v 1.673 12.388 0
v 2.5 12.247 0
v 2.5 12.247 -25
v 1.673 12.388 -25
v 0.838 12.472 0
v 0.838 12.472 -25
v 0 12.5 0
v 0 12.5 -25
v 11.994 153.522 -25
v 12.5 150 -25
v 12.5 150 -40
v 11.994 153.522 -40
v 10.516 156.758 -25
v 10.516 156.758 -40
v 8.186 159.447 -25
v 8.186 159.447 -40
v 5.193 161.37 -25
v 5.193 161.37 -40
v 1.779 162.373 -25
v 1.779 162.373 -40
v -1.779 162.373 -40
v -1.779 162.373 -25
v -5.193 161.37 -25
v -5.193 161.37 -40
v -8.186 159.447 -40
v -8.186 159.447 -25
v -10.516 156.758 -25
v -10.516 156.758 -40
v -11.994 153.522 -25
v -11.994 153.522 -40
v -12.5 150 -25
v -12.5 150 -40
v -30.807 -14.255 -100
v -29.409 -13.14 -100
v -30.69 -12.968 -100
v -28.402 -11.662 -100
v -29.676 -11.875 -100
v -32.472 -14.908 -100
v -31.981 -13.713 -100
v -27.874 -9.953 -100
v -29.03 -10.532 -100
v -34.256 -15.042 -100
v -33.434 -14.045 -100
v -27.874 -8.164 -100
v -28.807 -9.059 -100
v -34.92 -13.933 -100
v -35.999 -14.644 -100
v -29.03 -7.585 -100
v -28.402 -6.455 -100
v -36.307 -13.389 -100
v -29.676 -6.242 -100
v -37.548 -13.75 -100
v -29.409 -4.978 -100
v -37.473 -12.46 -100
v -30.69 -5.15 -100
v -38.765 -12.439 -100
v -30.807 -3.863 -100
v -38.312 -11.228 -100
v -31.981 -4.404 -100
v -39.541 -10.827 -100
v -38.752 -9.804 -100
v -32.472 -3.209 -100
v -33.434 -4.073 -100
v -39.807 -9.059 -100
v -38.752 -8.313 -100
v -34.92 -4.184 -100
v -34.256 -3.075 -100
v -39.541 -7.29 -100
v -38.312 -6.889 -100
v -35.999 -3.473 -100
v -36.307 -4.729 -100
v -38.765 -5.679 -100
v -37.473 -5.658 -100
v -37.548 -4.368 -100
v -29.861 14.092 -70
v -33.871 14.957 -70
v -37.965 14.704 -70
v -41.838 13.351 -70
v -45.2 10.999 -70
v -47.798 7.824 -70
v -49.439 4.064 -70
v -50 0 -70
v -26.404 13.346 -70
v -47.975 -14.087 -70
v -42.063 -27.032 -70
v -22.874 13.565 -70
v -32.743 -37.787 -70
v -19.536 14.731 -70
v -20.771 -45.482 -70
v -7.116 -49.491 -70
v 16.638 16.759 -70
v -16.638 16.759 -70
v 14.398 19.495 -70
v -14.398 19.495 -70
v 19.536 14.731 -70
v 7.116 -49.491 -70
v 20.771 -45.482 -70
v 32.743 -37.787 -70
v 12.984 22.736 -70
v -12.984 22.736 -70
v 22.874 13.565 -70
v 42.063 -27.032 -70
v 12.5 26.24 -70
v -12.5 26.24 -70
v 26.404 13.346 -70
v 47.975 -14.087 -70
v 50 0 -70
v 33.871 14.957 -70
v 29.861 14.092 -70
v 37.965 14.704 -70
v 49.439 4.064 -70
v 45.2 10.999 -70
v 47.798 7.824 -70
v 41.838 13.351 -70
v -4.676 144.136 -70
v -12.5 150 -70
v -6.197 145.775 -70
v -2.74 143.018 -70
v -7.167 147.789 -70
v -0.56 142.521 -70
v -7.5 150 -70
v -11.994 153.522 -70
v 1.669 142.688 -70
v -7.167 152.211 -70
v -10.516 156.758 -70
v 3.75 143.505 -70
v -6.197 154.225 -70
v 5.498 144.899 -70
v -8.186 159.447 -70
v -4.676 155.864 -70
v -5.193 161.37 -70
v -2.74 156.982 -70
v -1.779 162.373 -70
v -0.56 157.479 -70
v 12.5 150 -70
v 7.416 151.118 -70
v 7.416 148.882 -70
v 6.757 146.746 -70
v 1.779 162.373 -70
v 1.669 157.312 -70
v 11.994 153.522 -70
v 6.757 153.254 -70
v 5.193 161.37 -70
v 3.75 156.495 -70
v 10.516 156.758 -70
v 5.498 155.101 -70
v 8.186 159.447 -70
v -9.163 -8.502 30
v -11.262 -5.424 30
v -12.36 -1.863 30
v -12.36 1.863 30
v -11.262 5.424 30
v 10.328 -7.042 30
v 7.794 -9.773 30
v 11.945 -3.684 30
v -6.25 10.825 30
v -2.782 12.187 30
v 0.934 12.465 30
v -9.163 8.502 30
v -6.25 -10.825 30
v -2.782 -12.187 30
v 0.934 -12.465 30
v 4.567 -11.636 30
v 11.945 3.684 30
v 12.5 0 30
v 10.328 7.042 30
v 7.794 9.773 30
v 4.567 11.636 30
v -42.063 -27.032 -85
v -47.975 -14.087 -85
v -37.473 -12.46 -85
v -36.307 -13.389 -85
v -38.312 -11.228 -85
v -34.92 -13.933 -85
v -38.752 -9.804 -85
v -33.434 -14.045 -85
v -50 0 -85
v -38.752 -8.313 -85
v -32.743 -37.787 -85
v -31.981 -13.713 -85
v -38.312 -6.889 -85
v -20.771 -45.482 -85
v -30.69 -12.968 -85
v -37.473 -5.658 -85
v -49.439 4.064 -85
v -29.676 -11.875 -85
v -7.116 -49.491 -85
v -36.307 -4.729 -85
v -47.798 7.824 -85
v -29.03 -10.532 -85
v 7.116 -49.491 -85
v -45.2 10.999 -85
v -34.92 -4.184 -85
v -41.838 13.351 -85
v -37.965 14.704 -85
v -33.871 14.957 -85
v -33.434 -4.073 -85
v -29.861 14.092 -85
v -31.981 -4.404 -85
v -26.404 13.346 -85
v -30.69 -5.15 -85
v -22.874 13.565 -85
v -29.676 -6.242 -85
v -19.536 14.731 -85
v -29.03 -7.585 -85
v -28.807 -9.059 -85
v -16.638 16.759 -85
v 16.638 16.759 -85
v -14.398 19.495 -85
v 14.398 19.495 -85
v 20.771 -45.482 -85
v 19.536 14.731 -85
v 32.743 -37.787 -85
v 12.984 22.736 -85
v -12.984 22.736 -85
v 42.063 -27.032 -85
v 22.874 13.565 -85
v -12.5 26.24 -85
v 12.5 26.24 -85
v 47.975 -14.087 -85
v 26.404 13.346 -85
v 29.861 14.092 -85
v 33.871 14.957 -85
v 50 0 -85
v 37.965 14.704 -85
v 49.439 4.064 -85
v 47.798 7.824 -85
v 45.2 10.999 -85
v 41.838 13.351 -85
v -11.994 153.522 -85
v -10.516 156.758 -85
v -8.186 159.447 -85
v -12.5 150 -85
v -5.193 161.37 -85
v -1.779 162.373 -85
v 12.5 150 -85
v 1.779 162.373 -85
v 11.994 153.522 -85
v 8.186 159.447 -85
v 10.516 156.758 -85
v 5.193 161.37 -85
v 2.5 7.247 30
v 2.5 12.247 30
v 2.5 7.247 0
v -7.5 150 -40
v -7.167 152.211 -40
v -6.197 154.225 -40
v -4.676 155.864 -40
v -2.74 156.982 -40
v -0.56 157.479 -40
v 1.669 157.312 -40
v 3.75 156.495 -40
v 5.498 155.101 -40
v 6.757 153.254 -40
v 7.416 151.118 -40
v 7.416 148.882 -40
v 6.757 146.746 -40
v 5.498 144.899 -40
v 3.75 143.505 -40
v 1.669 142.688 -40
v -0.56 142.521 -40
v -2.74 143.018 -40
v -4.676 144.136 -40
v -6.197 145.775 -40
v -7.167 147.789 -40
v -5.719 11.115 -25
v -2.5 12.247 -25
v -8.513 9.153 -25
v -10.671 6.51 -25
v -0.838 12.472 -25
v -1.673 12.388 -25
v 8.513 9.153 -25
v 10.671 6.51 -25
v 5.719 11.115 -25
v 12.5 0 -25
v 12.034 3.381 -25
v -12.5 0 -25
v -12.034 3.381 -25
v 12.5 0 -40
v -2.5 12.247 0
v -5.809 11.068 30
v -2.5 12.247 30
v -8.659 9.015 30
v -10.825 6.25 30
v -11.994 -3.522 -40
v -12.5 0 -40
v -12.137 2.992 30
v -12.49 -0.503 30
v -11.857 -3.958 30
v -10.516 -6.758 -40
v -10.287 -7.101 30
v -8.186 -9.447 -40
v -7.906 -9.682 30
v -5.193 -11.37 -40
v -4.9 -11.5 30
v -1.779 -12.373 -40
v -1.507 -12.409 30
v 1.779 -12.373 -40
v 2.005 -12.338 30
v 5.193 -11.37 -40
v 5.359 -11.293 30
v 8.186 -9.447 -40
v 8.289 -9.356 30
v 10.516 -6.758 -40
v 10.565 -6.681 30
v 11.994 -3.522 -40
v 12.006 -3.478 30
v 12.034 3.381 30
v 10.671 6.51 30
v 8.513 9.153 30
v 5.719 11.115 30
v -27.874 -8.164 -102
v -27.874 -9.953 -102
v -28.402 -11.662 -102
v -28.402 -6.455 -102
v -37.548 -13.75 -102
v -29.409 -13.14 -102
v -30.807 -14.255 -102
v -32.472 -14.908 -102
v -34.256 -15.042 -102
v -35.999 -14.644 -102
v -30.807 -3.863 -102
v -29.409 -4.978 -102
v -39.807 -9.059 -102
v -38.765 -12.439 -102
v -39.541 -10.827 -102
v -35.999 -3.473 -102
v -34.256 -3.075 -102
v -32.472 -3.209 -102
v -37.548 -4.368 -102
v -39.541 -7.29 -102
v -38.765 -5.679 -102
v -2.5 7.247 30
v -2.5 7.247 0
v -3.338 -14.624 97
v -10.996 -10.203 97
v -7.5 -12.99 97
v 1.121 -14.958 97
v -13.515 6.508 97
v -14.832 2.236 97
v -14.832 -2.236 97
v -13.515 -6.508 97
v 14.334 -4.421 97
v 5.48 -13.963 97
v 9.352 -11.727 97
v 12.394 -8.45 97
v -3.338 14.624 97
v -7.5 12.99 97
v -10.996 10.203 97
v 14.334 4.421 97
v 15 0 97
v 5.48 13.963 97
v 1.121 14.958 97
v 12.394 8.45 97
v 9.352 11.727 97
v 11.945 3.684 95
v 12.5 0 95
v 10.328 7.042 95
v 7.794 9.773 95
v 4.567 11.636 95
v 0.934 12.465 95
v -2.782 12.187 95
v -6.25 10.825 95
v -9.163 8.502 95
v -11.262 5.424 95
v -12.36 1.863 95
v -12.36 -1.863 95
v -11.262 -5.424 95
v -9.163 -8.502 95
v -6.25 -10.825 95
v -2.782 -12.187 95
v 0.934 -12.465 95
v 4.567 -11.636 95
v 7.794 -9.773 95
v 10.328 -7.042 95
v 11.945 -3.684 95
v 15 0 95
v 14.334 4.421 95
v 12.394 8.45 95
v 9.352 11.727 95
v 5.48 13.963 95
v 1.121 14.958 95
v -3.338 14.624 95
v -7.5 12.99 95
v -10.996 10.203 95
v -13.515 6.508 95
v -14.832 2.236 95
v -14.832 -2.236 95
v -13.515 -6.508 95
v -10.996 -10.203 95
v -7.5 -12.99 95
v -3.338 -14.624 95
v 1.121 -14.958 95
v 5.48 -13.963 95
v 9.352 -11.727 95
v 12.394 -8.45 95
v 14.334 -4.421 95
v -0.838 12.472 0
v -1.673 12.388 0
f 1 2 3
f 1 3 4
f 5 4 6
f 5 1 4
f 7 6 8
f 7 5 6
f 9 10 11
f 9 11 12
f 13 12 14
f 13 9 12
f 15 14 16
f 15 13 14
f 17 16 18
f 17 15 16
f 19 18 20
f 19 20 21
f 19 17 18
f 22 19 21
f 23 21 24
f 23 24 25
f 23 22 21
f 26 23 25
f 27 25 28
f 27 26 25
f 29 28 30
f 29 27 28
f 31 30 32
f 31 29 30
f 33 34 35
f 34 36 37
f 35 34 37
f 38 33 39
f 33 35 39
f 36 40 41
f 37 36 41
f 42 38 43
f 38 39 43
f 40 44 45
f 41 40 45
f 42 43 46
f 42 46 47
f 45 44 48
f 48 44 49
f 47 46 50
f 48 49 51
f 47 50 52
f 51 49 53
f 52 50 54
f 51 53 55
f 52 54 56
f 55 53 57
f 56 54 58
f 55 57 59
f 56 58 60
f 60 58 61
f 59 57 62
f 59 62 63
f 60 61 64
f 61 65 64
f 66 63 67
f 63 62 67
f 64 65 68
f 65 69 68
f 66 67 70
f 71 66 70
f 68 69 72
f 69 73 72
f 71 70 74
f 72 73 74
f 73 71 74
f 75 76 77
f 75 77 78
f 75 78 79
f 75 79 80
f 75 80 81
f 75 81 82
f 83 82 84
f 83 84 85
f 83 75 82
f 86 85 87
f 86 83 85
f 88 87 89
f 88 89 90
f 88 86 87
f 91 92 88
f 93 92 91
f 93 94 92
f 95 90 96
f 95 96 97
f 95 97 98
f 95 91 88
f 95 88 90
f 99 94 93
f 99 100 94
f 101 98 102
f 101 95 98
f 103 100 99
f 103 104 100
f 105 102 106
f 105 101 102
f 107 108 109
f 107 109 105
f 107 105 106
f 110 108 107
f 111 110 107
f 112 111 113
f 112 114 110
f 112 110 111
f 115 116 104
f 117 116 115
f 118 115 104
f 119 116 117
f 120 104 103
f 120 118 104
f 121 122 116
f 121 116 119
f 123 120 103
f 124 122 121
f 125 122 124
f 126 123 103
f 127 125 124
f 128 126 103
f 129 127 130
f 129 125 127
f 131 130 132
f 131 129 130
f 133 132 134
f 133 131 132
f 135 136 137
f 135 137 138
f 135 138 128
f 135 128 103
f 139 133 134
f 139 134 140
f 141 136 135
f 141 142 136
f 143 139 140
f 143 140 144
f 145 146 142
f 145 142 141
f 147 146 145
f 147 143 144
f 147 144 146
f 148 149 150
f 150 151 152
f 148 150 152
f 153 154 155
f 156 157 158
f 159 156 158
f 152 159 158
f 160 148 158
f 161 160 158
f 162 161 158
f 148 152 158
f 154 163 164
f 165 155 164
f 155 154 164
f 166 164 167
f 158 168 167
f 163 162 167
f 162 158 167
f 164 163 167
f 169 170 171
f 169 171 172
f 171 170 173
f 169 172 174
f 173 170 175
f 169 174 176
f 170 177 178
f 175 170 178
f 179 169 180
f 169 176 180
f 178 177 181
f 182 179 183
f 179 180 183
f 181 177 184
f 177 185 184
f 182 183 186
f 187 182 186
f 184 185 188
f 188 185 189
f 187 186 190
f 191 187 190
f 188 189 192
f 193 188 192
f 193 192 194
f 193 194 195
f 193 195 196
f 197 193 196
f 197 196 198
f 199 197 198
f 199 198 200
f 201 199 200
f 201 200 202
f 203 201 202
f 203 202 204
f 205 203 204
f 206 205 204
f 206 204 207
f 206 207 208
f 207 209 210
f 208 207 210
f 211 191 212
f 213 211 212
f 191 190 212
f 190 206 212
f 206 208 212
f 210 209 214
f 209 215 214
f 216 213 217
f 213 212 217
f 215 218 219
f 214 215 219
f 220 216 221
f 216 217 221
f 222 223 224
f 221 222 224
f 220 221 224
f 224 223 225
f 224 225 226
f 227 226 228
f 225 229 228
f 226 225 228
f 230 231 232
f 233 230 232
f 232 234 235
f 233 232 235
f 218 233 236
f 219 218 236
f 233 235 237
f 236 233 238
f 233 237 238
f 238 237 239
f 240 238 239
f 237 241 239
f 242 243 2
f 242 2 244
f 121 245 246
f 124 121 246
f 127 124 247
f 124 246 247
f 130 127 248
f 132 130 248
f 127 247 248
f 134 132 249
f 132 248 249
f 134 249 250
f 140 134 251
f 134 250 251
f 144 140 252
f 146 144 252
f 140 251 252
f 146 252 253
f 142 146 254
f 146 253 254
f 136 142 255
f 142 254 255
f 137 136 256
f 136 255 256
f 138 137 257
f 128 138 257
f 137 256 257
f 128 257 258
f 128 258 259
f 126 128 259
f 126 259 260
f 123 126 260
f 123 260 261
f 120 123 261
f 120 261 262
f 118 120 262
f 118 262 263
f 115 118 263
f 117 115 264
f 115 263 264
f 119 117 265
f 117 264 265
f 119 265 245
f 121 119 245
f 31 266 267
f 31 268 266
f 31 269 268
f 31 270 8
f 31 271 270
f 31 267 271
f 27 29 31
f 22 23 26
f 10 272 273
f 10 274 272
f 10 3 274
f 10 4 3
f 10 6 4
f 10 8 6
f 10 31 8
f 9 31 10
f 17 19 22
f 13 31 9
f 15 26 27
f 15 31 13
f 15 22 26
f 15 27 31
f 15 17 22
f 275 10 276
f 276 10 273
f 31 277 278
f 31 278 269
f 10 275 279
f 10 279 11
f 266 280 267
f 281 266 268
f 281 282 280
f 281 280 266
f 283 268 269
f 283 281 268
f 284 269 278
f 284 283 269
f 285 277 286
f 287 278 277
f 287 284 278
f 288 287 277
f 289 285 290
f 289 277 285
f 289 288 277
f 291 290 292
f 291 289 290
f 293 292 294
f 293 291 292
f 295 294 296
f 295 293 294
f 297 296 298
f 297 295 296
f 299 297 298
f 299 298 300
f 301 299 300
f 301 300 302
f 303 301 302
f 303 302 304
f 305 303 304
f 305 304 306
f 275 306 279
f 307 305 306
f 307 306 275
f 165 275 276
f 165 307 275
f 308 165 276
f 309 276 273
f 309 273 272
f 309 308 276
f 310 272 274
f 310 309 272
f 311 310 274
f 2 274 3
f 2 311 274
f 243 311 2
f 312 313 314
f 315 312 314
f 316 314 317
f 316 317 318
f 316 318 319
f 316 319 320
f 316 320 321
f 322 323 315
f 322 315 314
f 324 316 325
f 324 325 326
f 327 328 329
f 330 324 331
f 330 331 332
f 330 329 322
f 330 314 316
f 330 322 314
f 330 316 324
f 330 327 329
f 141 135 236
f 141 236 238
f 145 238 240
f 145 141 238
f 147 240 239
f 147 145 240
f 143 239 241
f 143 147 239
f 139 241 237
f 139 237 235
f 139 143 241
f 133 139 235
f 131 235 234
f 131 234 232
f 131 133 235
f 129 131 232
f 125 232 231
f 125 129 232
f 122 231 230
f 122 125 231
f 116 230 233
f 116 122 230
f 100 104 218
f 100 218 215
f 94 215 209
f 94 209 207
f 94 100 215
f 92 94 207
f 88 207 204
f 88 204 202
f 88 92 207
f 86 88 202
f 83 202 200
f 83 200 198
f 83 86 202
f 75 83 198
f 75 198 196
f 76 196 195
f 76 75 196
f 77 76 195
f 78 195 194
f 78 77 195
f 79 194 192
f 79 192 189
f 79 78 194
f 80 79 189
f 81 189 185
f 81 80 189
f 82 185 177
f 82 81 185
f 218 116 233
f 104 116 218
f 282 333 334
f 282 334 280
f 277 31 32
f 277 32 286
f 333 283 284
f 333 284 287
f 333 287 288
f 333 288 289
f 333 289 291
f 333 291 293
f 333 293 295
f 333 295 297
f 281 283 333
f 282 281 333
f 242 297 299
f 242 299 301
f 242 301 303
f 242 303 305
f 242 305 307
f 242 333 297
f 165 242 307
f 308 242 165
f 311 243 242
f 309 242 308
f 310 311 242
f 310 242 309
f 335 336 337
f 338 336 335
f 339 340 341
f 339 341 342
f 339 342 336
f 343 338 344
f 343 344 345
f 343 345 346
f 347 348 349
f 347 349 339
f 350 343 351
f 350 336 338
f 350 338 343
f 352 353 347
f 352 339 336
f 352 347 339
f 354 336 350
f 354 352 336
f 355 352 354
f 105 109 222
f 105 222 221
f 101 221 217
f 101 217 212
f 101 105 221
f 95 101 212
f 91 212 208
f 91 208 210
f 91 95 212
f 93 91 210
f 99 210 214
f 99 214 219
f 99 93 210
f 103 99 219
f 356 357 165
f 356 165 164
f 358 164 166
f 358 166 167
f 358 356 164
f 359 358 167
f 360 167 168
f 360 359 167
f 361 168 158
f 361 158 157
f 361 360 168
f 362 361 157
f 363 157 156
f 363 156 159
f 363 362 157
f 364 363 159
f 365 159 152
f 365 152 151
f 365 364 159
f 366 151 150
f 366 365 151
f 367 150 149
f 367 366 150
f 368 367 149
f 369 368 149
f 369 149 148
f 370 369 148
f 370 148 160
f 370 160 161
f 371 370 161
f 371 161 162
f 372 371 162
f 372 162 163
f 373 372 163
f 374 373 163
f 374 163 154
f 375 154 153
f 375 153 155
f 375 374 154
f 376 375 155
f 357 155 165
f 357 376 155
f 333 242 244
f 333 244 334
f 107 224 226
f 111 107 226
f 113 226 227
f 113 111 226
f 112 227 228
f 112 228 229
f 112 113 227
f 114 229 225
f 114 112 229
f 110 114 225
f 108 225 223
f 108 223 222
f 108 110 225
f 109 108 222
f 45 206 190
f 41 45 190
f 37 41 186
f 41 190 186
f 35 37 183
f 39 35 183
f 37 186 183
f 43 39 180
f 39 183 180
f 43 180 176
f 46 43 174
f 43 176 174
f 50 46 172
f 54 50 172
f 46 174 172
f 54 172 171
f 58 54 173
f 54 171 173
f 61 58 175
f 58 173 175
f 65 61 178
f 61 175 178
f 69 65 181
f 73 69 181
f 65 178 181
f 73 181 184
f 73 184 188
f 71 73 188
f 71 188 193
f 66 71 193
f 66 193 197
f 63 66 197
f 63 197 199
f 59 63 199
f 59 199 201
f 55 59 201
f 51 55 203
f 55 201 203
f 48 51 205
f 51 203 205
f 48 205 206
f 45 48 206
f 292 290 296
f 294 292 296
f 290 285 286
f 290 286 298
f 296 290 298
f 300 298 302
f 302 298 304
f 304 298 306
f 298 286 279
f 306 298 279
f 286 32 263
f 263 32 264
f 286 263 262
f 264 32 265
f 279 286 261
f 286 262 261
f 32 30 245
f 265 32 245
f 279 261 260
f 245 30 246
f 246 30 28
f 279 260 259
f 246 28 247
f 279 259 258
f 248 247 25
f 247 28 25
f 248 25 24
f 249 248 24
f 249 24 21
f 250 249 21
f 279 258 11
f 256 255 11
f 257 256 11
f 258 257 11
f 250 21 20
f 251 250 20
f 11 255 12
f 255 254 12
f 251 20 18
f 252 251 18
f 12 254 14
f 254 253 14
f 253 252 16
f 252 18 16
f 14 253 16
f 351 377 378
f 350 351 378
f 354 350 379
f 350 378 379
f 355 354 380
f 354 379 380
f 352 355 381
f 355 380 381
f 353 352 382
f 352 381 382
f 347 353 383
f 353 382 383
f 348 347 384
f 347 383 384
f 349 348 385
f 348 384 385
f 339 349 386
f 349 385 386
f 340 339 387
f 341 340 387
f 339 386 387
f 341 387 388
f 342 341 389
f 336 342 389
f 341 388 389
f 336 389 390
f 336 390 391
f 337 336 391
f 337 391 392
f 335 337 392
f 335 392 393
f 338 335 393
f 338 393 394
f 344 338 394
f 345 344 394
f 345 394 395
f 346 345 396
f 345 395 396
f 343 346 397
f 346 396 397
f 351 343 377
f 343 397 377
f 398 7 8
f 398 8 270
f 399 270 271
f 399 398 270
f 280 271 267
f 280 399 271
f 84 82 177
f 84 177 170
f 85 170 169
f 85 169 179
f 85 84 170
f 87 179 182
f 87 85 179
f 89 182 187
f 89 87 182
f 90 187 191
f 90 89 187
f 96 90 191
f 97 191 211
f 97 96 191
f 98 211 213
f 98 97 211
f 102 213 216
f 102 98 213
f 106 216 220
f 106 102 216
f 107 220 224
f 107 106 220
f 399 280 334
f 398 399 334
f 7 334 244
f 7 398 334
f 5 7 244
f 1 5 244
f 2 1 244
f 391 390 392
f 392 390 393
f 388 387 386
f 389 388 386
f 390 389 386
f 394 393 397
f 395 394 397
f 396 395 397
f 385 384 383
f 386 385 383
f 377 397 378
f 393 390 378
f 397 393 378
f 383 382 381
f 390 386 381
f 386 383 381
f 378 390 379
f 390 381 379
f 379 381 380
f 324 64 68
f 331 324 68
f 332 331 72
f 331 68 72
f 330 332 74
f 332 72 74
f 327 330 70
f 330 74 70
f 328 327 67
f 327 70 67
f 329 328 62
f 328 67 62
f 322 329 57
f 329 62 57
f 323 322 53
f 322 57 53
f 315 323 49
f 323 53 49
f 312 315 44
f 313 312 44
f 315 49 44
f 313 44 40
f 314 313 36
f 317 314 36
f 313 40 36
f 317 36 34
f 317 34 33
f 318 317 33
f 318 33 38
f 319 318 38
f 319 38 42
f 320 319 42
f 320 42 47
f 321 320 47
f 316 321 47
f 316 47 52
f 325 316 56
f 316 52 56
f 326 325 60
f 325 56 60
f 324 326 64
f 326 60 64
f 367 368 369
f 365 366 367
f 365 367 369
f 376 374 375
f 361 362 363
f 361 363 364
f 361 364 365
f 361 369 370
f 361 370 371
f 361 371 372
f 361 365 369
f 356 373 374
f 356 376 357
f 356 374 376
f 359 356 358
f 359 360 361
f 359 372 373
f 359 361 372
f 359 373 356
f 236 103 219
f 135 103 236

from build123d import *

# Parameters (mm, degrees)
BOSS_EXTRUDE1_START  = 30
BOSS_EXTRUDE1_DEPTH  = 55
BOSS_EXTRUDE3_DEPTH  = 15
SKETCH5_R            = 7.5
BOSS_EXTRUDE4_DEPTH  = 30
BOSS_EXTRUDE5_DEPTH  = 15
BOSS_EXTRUDE7_DEPTH  = 15
BOSS_EXTRUDE8_START  = 65
SKETCH12_R           = 12.5
BOSS_EXTRUDE8_DEPTH  = 65
SKETCH14_R           = 15
BOSS_EXTRUDE9_DEPTH  = 2
SKETCH2_5_W          = 5
SKETCH2_5_H          = 5
BOSS_EXTRUDE10_DEPTH = 30
SKETCH10_R           = 5
BOSS_EXTRUDE11_DEPTH = 15
BOSS_EXTRUDE12_START = 15
SKETCH10_3_R         = 6
SKETCH10_3_R_2       = 5
BOSS_EXTRUDE12_DEPTH = 2


with BuildPart() as part:
    # Sketch2 → Boss-Extrude1 (new body)
    with BuildSketch(Plane.XY.offset(BOSS_EXTRUDE1_START)):
        with BuildLine():
            Line((-2.5, 7.247448714), (-2.5, 12.247448714))
            ThreePointArc((-2.5, 12.247448714), (-7.90569415, -9.682458366), (12.5, 0))
            ThreePointArc((12.5, 0), (9.682458366, 7.90569415), (2.5, 12.247448714))
            Line((2.5, 12.247448714), (2.5, 7.247448714))
            Line((2.5, 7.247448714), (-2.5, 7.247448714))
        make_face()
    extrude(amount=-BOSS_EXTRUDE1_DEPTH)

    # Sketch3 → Boss-Extrude3 (add)
    with BuildSketch(Plane(origin=(0, 0, -25), x_dir=(-1, 0, 0), z_dir=(0, 0, -1))):
        with BuildLine():
            Line((-12.5, 0), (-12.5, 150))
            ThreePointArc((-12.5, 150), (0, 162.5), (12.5, 150))
            Line((12.5, 150), (12.5, 0))
            ThreePointArc((12.5, 0), (0, -12.5), (-12.5, 0))
        make_face()
    extrude(amount=BOSS_EXTRUDE3_DEPTH)

    # Sketch5 → Boss-Extrude4 (add)
    with BuildSketch(Plane(origin=(0, 0, -40), x_dir=(-1, 0, 0), z_dir=(0, 0, -1))):
        with Locations((0, 150)):
            Circle(SKETCH5_R)
    extrude(amount=BOSS_EXTRUDE4_DEPTH)

    # Sketch6 → Boss-Extrude5 (add)
    with BuildSketch(Plane(origin=(0, 0, -70), x_dir=(-1, 0, 0), z_dir=(0, 0, -1))):
        with BuildLine():
            Line((12.5, 150), (12.5, 0))
            ThreePointArc((12.5, 0), (0, -12.5), (-12.5, 0))
            Line((-12.5, 0), (-12.5, 150))
            ThreePointArc((-12.5, 150), (0, 162.5), (12.5, 150))
        make_face()
    extrude(amount=BOSS_EXTRUDE5_DEPTH)

    # Sketch8 → Boss-Extrude7 (add)
    with BuildSketch(Plane(origin=(0, 0, -70), x_dir=(-1, 0, 0), z_dir=(0, 0, -1))):
        with BuildLine():
            ThreePointArc((50, 0), (0, -50), (-50, 0))
            ThreePointArc((-50, 0), (-43.599648561, 12.290079114), (-29.860527384, 14.092048156))
            ThreePointArc((-29.860527384, 14.092048156), (-18.017198913, 15.645372491), (-12.5, 26.239604975))
            ThreePointArc((-12.5, 26.239604975), (0, 38.739604975), (12.5, 26.239604975))
            ThreePointArc((12.5, 26.239604975), (18.017198913, 15.645372491), (29.860527384, 14.092048156))
            ThreePointArc((29.860527384, 14.092048156), (43.599648561, 12.290079114), (50, 0))
        make_face()
    extrude(amount=BOSS_EXTRUDE7_DEPTH)

    # Sketch2<5> → Boss-Extrude10 (add)
    with BuildSketch(Plane.XY):
        with BuildLine():
            Line((-2.5, 7.247448714), (-2.5, 12.247448714))
            ThreePointArc((-2.5, 12.247448714), (-7.90569415, -9.682458366), (12.5, 0))
            ThreePointArc((12.5, 0), (9.682458366, 7.90569415), (2.5, 12.247448714))
            Line((2.5, 12.247448714), (2.5, 7.247448714))
            Line((2.5, 7.247448714), (-2.5, 7.247448714))
        make_face()
        with Locations((0, 9.747448714)):
            Rectangle(SKETCH2_5_W, SKETCH2_5_H)
        with BuildLine():
            ThreePointArc((0, 12.5), (-1.256362025, 12.436701913), (-2.5, 12.247448714))
            Line((-2.5, 12.247448714), (0, 12.247448714))
            Line((0, 12.247448714), (0, 12.5))
        make_face()
        with BuildLine():
            Line((0, 12.5), (0, 12.247448714))
            Line((0, 12.247448714), (2.5, 12.247448714))
            ThreePointArc((2.5, 12.247448714), (1.256362025, 12.436701913), (0, 12.5))
        make_face()
    extrude(amount=-BOSS_EXTRUDE10_DEPTH)

    # Sketch10 → Boss-Extrude11 (add)
    with BuildSketch(Plane(origin=(0, 0, -85), x_dir=(-1, 0, 0), z_dir=(0, 0, -1))):
        with Locations(Location((33.80740392, -9.058666579, 0), (0, 0, 180))):
            Circle(SKETCH10_R)
    extrude(amount=BOSS_EXTRUDE11_DEPTH)

    # Sketch10<3> → Boss-Extrude12 (add)
    # profile 1 of 2: a face of its own
    with BuildSketch(Plane(origin=(0, 0, -85), x_dir=(-1, 0, 0), z_dir=(0, 0, -1)).offset(BOSS_EXTRUDE12_START)):
        with Locations((33.80740392, -9.058666579)):
            Circle(SKETCH10_3_R)
        with Locations(Location((33.80740392, -9.058666579, 0), (0, 0, 180))):
            Circle(SKETCH10_3_R_2, mode=Mode.SUBTRACT)
    # profile 2 of 2: a face of its own
    with BuildSketch(Plane(origin=(0, 0, -85), x_dir=(-1, 0, 0), z_dir=(0, 0, -1)).offset(BOSS_EXTRUDE12_START)):
        with Locations(Location((33.80740392, -9.058666579, 0), (0, 0, 180))):
            Circle(SKETCH10_3_R_2)
    extrude(amount=BOSS_EXTRUDE12_DEPTH)


with BuildPart() as body_2:
    # Sketch12 → Boss-Extrude8 (new body)
    with BuildSketch(Plane.XY.offset(30).offset(BOSS_EXTRUDE8_START)):
        Circle(SKETCH12_R)
    extrude(amount=-BOSS_EXTRUDE8_DEPTH)


with BuildPart() as body_3:
    # Sketch14 → Boss-Extrude9 (new body)
    with BuildSketch(Plane.XY.offset(95)):
        Circle(SKETCH14_R)
    extrude(amount=BOSS_EXTRUDE9_DEPTH)


solid = Compound([part.part, body_2.part, body_3.part])
